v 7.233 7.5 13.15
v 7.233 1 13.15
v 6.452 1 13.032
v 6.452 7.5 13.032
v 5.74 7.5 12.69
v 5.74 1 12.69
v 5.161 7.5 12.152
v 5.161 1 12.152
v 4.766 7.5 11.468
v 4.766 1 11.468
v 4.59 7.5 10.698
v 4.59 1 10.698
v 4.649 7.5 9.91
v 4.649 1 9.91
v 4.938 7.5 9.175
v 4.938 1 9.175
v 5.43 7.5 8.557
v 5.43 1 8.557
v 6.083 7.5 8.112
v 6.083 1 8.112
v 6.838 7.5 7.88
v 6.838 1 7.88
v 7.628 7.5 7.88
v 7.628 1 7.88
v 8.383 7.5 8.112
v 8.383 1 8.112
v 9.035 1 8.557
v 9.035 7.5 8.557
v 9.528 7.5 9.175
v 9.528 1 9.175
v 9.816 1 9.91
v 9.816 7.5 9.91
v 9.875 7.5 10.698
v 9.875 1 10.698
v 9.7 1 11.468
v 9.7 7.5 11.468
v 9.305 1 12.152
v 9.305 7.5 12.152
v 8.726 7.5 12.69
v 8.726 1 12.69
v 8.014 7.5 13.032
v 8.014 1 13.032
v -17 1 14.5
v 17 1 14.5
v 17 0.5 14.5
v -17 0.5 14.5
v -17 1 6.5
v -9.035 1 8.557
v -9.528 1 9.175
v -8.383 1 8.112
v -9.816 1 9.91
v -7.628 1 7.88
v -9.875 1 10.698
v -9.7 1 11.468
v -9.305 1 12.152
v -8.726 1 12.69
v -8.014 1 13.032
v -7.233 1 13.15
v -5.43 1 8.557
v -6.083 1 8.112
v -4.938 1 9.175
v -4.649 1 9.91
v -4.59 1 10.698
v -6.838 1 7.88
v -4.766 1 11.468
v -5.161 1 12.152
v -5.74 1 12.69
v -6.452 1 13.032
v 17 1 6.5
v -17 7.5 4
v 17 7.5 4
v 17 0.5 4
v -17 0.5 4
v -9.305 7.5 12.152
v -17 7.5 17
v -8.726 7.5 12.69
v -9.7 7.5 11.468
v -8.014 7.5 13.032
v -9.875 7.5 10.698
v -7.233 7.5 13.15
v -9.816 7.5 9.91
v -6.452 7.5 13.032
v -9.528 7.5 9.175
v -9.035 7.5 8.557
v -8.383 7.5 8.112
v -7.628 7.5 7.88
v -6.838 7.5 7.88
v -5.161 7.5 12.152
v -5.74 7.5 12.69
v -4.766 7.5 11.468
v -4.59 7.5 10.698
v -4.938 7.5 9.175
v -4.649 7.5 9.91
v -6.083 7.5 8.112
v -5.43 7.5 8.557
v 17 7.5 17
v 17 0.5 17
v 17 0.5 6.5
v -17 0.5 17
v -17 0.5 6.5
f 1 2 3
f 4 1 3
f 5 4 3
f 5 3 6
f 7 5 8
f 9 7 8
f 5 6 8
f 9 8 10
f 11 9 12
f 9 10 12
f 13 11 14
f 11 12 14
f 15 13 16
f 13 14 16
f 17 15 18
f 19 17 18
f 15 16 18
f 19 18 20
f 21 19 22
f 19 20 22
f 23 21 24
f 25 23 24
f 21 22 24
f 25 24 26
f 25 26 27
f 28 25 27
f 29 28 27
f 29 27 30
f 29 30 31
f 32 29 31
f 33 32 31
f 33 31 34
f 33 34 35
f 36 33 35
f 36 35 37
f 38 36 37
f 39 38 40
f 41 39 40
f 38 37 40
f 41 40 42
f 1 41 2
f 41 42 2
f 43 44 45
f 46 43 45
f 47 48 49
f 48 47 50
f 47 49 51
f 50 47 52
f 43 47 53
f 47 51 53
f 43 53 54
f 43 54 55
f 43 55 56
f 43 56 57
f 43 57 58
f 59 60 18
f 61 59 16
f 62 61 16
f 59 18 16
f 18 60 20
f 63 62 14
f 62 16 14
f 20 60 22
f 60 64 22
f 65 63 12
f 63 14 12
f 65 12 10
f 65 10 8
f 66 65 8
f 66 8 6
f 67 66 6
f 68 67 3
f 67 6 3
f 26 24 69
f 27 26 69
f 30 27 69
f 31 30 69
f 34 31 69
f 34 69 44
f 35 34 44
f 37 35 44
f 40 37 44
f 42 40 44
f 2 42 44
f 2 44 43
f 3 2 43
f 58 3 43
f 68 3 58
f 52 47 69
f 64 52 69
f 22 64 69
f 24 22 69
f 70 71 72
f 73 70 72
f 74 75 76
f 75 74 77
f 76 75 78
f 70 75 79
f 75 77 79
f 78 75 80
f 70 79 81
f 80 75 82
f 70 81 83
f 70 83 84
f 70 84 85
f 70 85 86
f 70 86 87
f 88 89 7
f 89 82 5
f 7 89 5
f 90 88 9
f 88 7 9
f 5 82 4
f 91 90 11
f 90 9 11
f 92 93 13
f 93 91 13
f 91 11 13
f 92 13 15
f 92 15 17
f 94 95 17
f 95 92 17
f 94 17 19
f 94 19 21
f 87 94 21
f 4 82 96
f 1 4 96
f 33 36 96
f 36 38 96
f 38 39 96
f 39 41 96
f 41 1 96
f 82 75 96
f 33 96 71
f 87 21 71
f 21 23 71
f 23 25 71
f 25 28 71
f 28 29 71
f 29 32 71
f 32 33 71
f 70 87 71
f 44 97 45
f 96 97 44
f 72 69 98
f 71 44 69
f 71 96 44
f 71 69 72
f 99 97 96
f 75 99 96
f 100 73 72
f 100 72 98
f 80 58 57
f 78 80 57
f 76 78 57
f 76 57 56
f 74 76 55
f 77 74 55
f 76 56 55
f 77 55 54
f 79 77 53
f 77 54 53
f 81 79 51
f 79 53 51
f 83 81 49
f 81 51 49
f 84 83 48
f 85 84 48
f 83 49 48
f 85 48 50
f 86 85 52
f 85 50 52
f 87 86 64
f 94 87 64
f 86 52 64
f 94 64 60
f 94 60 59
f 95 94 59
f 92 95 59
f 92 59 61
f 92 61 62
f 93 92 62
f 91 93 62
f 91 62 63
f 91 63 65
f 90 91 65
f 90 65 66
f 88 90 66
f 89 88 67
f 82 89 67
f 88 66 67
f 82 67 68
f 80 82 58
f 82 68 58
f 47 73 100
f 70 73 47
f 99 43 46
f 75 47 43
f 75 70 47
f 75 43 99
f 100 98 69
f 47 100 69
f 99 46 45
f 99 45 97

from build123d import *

# Parameters (mm, degrees)
BOSS_EXTRUDE1_DEPTH             = 16
SKETCH2_W                       = 34
SKETCH2_H                       = 8
CUT_EXTRUDE1_DEPTH              = 0.5
SKETCH7_R                       = 8.5
CUT_EXTRUDE2_DEPTH              = 2
BOSS_EXTRUDE2_DEPTH             = 3
BOSS_EXTRUDE3_REACH             = 31.159
BOSS_EXTRUDE3_DIRECTION_2_REACH = 31.159
SKETCH11_W                      = 2.65
SKETCH11_H                      = 24
M5_CLEARANCE_HOLE2_AT_2_COUNT   = 2
M5_CLEARANCE_HOLE2_AT_2_PITCH   = 25.394250395
M5_CLEARANCE_HOLE2_AT_3_COUNT   = 2
M5_CLEARANCE_HOLE2_AT_3_PITCH   = 19.596880573
M5_CLEARANCE_HOLE2_AT_4_COUNT   = 2
M5_CLEARANCE_HOLE2_AT_4_PITCH   = 14.465476141
MOVE_FACE1_BY                   = 0.5
FILLET1_R                       = 0.4
CHAMFER1_SIZE                   = 0.6
FILLET2_R                       = 0.2


# Read off the part's stored shape, not the designer's step: M4 Tapped Hole2
with BuildPart() as part:
    # Sketch1 → Boss-Extrude1 (new body)
    with BuildSketch(Plane(origin=(0, -16.5, 0), x_dir=(-1, 0, 0), z_dir=(0, -1, 0))):
        with BuildLine():
            Line((17, -17), (-17, -17))
            Line((-17, -17), (-17, 0))
            ThreePointArc((-17, 0), (0, 17), (17, 0))
            Line((17, 0), (17, -17))
        make_face()
    extrude(amount=-BOSS_EXTRUDE1_DEPTH)

    # Sketch2 → Cut-Extrude1 (cut)
    with BuildSketch(Plane(origin=(0, -0.5, 0), x_dir=(1, 0, 0), z_dir=(0, 1, 0))):
        with Locations((0, -10.5)):
            Rectangle(SKETCH2_W, SKETCH2_H)
    extrude(amount=-CUT_EXTRUDE1_DEPTH, mode=Mode.SUBTRACT)

    # Sketch7 → Cut-Extrude2 (cut)
    with BuildSketch(Plane.XZ.offset(16.5)):
        with Locations(Location((0, 0, 0), (0, 0, 270))):
            Circle(SKETCH7_R)
    extrude(amount=-CUT_EXTRUDE2_DEPTH, mode=Mode.SUBTRACT)

    # Sketch8 → Boss-Extrude2 (add)
    with BuildSketch(Plane(origin=(0, -0.5, 0), x_dir=(1, 0, 0), z_dir=(0, 1, 0))):
        with BuildLine():
            Line((-17, -4), (17, -4))
            Line((17, -4), (17, 0))
            ThreePointArc((17, 0), (0, 17), (-17, 0))
            Line((-17, 0), (-17, -4))
        make_face()
    extrude(amount=BOSS_EXTRUDE2_DEPTH)


with BuildPart() as body_2:

    # Boss-Extrude3: up to this face of the body (flat: up to its plane)
    boss_extrude3_end = Plane(part.part.faces().sort_by_distance((17, -8.203571429, 8.192857143))[0])
    # Sketch9 → Boss-Extrude3 (new, up to the picked face)
    with BuildSketch(Plane(origin=(0, 0, 0), x_dir=(0, 0, -1), z_dir=(1, 0, 0)), mode=Mode.PRIVATE) as boss_extrude3_sk1:
        Polygon((-14.5, 1), (-14.5, 0.5), (-17, 0.5), (-17, 7.5), (-4, 7.5), (-4, 0.5), (-6.5, 0.5), (-6.5, 1), align=None)
    boss_extrude3_tool1 = split(extrude(boss_extrude3_sk1.sketch, amount=BOSS_EXTRUDE3_REACH, mode=Mode.PRIVATE), bisect_by=boss_extrude3_end, keep=Keep.BOTH, mode=Mode.PRIVATE)
    add(boss_extrude3_tool1.solids().sort_by(Axis((0, 4.149425, 10.5), (1, 0, 0)))[0])


    # Boss-Extrude3 direction 2: up to this face of the body (flat: up to its plane)
    boss_extrude3_direction_2_end = Plane(part.part.faces().sort_by_distance((-17, -8.203571429, 8.192857143))[0])
    # Sketch9 → Boss-Extrude3 direction 2 (add, up to the picked face)
    with BuildSketch(Plane(origin=(0, 0, 0), x_dir=(0, 0, -1), z_dir=(1, 0, 0)), mode=Mode.PRIVATE) as boss_extrude3_direction_2_sk1:
        Polygon((-14.5, 1), (-14.5, 0.5), (-17, 0.5), (-17, 7.5), (-4, 7.5), (-4, 0.5), (-6.5, 0.5), (-6.5, 1), align=None)
    boss_extrude3_direction_2_tool1 = split(extrude(boss_extrude3_direction_2_sk1.sketch, amount=-BOSS_EXTRUDE3_DIRECTION_2_REACH, mode=Mode.PRIVATE), bisect_by=boss_extrude3_direction_2_end, keep=Keep.BOTH, mode=Mode.PRIVATE)
    add(boss_extrude3_direction_2_tool1.solids().sort_by(Axis((0, 4.149425, 10.5), (-1, 0, 0)))[0])


with BuildPart() as m5_clearance_hole2_tool:
    # Sketch11 → M5 Clearance Hole2 (revolve)
    with BuildSketch(Plane(origin=(7.232738071, 7.5, 10.5), x_dir=(0, 0, 1), z_dir=(1, 0, 0))):
        with Locations((1.325, 12)):
            Rectangle(SKETCH11_W, SKETCH11_H)
    m5_clearance_hole2 = revolve(axis=Axis((7.232738071, 13.85, 10.5), (0, -1, 0)))


with BuildPart() as part_1:
    add(part.part)

    # M5 Clearance Hole2: cut by m5_clearance_hole2_tool
    add(m5_clearance_hole2_tool.part, mode=Mode.SUBTRACT)

    # M5 Clearance Hole2 at 2: M5 Clearance Hole2 ×2
    with Locations(*[Vector(-0.6398436369623559, 0, -0.768505120502645) * (i * M5_CLEARANCE_HOLE2_AT_2_PITCH) for i in range(1, M5_CLEARANCE_HOLE2_AT_2_COUNT)]):
        add(m5_clearance_hole2, mode=Mode.SUBTRACT)

    # M5 Clearance Hole2 at 3: M5 Clearance Hole2 ×2
    with Locations(*[Vector(0.09097740748886189, 0, -0.9958529566791503) * (i * M5_CLEARANCE_HOLE2_AT_3_PITCH) for i in range(1, M5_CLEARANCE_HOLE2_AT_3_COUNT)]):
        add(m5_clearance_hole2, mode=Mode.SUBTRACT)


with BuildPart() as body_2_1:
    add(body_2.part)

    # M5 Clearance Hole2: cut by m5_clearance_hole2_tool
    add(m5_clearance_hole2_tool.part, mode=Mode.SUBTRACT)


with BuildPart() as m5_clearance_hole2_at_4_tool:
    # M5 Clearance Hole2 at 4: M5 Clearance Hole2 ×2
    with Locations(*[(-i * M5_CLEARANCE_HOLE2_AT_4_PITCH, 0, 0) for i in range(1, M5_CLEARANCE_HOLE2_AT_4_COUNT)]):
        add(m5_clearance_hole2)


with BuildPart() as part_2:
    add(part_1.part)

    # M5 Clearance Hole2 at 4: cut by m5_clearance_hole2_at_4_tool
    add(m5_clearance_hole2_at_4_tool.part, mode=Mode.SUBTRACT)

    # M4 Tapped Hole2 outline → M4 Tapped Hole2 (revolve, cut)
    with BuildSketch(Plane(origin=(0, -3.5, 5), x_dir=(0, 1, 0), z_dir=(0, 0, -1))):
        Polygon((0, 17), (0, 5.908579979), (1.65, 6.9), (1.65, 17), align=None)
        Polygon((1.65, -6.9), (0, -5.908579979), (0, -17), (1.65, -17), align=None)
    revolve(axis=Axis((0, -3.5, 5), (1, 0, 0)), mode=Mode.SUBTRACT)

    # M4 Tapped Hole2 2 outline → M4 Tapped Hole2 2 (revolve, cut)
    with BuildSketch(Plane(origin=(0, -11.5, 5), x_dir=(0, 1, 0), z_dir=(0, 0, -1))):
        Polygon((0, 17), (0, 5.908579979), (1.65, 6.9), (1.65, 17), align=None)
        Polygon((1.65, -6.9), (0, -5.908579979), (0, -17), (1.65, -17), align=None)
    revolve(axis=Axis((0, -11.5, 5), (1, 0, 0)), mode=Mode.SUBTRACT)

    # Move Face1: a face moved inward by 0.5
    extrude(part_2.faces().sort_by_distance((0, -14.5, 0))[0], amount=MOVE_FACE1_BY, dir=(0, 1, 0), mode=Mode.SUBTRACT)

    # Fillet1
    fillet1_edges = [part_2.edges().sort_by_distance(p)[0] for p in [
        (0, -14, 8.5),
    ]]
    fillet(fillet1_edges, radius=FILLET1_R)

    # Chamfer1
    chamfer1_edges = [part_2.edges().sort_by_distance(p)[0] for p in [
        (0, -16.5, 8.5),
    ]]
    chamfer(chamfer1_edges, length=CHAMFER1_SIZE)

    # Fillet2
    fillet2_edges = [part_2.edges().sort_by_distance(p)[0] for p in [
        (0, -0.5, 4),
    ]]
    fillet(fillet2_edges, radius=FILLET2_R)


with BuildPart() as body_2_2:
    add(body_2_1.part)

    # M5 Clearance Hole2 at 4: cut by m5_clearance_hole2_at_4_tool
    add(m5_clearance_hole2_at_4_tool.part, mode=Mode.SUBTRACT)


solid = body_2_2.part
